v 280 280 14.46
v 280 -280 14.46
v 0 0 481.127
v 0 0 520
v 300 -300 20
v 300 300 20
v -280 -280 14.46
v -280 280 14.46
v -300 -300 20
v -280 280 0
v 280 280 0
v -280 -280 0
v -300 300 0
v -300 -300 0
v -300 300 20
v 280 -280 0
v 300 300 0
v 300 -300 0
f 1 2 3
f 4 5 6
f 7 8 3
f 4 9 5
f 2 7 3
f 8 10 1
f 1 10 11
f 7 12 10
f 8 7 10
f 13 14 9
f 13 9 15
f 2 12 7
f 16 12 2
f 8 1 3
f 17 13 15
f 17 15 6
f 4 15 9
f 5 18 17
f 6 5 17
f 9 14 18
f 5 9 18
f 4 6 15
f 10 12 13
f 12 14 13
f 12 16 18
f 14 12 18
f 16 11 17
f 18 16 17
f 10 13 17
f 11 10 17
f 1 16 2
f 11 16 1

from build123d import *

# Parameters (mm, degrees)
F0_W      = 600
F0_H      = 600
F1_DEPTH  = 20
F1_FACE_W = 600
F1_FACE_H = 600
F5_T      = -20


with BuildPart() as f1:
    # F0 (on Top) → F1 (new body)
    with BuildSketch(Plane.XY):
        Rectangle(F0_W, F0_H)
    extrude(amount=F1_DEPTH)

    # F1_face (on face) → F4 section 0
    with BuildSketch(Plane.XY.offset(20), mode=Mode.PRIVATE) as f4_s0:
        Rectangle(F1_FACE_W, F1_FACE_H)
    loft([f4_s0.sketch, Vertex(0, 0, 520)])

    # F5
    f5_openings = [f1.faces().sort_by_distance(p)[0] for p in [
        (0, 0, 0),
    ]]
    offset(amount=F5_T, openings=f5_openings)


solid = f1.part
